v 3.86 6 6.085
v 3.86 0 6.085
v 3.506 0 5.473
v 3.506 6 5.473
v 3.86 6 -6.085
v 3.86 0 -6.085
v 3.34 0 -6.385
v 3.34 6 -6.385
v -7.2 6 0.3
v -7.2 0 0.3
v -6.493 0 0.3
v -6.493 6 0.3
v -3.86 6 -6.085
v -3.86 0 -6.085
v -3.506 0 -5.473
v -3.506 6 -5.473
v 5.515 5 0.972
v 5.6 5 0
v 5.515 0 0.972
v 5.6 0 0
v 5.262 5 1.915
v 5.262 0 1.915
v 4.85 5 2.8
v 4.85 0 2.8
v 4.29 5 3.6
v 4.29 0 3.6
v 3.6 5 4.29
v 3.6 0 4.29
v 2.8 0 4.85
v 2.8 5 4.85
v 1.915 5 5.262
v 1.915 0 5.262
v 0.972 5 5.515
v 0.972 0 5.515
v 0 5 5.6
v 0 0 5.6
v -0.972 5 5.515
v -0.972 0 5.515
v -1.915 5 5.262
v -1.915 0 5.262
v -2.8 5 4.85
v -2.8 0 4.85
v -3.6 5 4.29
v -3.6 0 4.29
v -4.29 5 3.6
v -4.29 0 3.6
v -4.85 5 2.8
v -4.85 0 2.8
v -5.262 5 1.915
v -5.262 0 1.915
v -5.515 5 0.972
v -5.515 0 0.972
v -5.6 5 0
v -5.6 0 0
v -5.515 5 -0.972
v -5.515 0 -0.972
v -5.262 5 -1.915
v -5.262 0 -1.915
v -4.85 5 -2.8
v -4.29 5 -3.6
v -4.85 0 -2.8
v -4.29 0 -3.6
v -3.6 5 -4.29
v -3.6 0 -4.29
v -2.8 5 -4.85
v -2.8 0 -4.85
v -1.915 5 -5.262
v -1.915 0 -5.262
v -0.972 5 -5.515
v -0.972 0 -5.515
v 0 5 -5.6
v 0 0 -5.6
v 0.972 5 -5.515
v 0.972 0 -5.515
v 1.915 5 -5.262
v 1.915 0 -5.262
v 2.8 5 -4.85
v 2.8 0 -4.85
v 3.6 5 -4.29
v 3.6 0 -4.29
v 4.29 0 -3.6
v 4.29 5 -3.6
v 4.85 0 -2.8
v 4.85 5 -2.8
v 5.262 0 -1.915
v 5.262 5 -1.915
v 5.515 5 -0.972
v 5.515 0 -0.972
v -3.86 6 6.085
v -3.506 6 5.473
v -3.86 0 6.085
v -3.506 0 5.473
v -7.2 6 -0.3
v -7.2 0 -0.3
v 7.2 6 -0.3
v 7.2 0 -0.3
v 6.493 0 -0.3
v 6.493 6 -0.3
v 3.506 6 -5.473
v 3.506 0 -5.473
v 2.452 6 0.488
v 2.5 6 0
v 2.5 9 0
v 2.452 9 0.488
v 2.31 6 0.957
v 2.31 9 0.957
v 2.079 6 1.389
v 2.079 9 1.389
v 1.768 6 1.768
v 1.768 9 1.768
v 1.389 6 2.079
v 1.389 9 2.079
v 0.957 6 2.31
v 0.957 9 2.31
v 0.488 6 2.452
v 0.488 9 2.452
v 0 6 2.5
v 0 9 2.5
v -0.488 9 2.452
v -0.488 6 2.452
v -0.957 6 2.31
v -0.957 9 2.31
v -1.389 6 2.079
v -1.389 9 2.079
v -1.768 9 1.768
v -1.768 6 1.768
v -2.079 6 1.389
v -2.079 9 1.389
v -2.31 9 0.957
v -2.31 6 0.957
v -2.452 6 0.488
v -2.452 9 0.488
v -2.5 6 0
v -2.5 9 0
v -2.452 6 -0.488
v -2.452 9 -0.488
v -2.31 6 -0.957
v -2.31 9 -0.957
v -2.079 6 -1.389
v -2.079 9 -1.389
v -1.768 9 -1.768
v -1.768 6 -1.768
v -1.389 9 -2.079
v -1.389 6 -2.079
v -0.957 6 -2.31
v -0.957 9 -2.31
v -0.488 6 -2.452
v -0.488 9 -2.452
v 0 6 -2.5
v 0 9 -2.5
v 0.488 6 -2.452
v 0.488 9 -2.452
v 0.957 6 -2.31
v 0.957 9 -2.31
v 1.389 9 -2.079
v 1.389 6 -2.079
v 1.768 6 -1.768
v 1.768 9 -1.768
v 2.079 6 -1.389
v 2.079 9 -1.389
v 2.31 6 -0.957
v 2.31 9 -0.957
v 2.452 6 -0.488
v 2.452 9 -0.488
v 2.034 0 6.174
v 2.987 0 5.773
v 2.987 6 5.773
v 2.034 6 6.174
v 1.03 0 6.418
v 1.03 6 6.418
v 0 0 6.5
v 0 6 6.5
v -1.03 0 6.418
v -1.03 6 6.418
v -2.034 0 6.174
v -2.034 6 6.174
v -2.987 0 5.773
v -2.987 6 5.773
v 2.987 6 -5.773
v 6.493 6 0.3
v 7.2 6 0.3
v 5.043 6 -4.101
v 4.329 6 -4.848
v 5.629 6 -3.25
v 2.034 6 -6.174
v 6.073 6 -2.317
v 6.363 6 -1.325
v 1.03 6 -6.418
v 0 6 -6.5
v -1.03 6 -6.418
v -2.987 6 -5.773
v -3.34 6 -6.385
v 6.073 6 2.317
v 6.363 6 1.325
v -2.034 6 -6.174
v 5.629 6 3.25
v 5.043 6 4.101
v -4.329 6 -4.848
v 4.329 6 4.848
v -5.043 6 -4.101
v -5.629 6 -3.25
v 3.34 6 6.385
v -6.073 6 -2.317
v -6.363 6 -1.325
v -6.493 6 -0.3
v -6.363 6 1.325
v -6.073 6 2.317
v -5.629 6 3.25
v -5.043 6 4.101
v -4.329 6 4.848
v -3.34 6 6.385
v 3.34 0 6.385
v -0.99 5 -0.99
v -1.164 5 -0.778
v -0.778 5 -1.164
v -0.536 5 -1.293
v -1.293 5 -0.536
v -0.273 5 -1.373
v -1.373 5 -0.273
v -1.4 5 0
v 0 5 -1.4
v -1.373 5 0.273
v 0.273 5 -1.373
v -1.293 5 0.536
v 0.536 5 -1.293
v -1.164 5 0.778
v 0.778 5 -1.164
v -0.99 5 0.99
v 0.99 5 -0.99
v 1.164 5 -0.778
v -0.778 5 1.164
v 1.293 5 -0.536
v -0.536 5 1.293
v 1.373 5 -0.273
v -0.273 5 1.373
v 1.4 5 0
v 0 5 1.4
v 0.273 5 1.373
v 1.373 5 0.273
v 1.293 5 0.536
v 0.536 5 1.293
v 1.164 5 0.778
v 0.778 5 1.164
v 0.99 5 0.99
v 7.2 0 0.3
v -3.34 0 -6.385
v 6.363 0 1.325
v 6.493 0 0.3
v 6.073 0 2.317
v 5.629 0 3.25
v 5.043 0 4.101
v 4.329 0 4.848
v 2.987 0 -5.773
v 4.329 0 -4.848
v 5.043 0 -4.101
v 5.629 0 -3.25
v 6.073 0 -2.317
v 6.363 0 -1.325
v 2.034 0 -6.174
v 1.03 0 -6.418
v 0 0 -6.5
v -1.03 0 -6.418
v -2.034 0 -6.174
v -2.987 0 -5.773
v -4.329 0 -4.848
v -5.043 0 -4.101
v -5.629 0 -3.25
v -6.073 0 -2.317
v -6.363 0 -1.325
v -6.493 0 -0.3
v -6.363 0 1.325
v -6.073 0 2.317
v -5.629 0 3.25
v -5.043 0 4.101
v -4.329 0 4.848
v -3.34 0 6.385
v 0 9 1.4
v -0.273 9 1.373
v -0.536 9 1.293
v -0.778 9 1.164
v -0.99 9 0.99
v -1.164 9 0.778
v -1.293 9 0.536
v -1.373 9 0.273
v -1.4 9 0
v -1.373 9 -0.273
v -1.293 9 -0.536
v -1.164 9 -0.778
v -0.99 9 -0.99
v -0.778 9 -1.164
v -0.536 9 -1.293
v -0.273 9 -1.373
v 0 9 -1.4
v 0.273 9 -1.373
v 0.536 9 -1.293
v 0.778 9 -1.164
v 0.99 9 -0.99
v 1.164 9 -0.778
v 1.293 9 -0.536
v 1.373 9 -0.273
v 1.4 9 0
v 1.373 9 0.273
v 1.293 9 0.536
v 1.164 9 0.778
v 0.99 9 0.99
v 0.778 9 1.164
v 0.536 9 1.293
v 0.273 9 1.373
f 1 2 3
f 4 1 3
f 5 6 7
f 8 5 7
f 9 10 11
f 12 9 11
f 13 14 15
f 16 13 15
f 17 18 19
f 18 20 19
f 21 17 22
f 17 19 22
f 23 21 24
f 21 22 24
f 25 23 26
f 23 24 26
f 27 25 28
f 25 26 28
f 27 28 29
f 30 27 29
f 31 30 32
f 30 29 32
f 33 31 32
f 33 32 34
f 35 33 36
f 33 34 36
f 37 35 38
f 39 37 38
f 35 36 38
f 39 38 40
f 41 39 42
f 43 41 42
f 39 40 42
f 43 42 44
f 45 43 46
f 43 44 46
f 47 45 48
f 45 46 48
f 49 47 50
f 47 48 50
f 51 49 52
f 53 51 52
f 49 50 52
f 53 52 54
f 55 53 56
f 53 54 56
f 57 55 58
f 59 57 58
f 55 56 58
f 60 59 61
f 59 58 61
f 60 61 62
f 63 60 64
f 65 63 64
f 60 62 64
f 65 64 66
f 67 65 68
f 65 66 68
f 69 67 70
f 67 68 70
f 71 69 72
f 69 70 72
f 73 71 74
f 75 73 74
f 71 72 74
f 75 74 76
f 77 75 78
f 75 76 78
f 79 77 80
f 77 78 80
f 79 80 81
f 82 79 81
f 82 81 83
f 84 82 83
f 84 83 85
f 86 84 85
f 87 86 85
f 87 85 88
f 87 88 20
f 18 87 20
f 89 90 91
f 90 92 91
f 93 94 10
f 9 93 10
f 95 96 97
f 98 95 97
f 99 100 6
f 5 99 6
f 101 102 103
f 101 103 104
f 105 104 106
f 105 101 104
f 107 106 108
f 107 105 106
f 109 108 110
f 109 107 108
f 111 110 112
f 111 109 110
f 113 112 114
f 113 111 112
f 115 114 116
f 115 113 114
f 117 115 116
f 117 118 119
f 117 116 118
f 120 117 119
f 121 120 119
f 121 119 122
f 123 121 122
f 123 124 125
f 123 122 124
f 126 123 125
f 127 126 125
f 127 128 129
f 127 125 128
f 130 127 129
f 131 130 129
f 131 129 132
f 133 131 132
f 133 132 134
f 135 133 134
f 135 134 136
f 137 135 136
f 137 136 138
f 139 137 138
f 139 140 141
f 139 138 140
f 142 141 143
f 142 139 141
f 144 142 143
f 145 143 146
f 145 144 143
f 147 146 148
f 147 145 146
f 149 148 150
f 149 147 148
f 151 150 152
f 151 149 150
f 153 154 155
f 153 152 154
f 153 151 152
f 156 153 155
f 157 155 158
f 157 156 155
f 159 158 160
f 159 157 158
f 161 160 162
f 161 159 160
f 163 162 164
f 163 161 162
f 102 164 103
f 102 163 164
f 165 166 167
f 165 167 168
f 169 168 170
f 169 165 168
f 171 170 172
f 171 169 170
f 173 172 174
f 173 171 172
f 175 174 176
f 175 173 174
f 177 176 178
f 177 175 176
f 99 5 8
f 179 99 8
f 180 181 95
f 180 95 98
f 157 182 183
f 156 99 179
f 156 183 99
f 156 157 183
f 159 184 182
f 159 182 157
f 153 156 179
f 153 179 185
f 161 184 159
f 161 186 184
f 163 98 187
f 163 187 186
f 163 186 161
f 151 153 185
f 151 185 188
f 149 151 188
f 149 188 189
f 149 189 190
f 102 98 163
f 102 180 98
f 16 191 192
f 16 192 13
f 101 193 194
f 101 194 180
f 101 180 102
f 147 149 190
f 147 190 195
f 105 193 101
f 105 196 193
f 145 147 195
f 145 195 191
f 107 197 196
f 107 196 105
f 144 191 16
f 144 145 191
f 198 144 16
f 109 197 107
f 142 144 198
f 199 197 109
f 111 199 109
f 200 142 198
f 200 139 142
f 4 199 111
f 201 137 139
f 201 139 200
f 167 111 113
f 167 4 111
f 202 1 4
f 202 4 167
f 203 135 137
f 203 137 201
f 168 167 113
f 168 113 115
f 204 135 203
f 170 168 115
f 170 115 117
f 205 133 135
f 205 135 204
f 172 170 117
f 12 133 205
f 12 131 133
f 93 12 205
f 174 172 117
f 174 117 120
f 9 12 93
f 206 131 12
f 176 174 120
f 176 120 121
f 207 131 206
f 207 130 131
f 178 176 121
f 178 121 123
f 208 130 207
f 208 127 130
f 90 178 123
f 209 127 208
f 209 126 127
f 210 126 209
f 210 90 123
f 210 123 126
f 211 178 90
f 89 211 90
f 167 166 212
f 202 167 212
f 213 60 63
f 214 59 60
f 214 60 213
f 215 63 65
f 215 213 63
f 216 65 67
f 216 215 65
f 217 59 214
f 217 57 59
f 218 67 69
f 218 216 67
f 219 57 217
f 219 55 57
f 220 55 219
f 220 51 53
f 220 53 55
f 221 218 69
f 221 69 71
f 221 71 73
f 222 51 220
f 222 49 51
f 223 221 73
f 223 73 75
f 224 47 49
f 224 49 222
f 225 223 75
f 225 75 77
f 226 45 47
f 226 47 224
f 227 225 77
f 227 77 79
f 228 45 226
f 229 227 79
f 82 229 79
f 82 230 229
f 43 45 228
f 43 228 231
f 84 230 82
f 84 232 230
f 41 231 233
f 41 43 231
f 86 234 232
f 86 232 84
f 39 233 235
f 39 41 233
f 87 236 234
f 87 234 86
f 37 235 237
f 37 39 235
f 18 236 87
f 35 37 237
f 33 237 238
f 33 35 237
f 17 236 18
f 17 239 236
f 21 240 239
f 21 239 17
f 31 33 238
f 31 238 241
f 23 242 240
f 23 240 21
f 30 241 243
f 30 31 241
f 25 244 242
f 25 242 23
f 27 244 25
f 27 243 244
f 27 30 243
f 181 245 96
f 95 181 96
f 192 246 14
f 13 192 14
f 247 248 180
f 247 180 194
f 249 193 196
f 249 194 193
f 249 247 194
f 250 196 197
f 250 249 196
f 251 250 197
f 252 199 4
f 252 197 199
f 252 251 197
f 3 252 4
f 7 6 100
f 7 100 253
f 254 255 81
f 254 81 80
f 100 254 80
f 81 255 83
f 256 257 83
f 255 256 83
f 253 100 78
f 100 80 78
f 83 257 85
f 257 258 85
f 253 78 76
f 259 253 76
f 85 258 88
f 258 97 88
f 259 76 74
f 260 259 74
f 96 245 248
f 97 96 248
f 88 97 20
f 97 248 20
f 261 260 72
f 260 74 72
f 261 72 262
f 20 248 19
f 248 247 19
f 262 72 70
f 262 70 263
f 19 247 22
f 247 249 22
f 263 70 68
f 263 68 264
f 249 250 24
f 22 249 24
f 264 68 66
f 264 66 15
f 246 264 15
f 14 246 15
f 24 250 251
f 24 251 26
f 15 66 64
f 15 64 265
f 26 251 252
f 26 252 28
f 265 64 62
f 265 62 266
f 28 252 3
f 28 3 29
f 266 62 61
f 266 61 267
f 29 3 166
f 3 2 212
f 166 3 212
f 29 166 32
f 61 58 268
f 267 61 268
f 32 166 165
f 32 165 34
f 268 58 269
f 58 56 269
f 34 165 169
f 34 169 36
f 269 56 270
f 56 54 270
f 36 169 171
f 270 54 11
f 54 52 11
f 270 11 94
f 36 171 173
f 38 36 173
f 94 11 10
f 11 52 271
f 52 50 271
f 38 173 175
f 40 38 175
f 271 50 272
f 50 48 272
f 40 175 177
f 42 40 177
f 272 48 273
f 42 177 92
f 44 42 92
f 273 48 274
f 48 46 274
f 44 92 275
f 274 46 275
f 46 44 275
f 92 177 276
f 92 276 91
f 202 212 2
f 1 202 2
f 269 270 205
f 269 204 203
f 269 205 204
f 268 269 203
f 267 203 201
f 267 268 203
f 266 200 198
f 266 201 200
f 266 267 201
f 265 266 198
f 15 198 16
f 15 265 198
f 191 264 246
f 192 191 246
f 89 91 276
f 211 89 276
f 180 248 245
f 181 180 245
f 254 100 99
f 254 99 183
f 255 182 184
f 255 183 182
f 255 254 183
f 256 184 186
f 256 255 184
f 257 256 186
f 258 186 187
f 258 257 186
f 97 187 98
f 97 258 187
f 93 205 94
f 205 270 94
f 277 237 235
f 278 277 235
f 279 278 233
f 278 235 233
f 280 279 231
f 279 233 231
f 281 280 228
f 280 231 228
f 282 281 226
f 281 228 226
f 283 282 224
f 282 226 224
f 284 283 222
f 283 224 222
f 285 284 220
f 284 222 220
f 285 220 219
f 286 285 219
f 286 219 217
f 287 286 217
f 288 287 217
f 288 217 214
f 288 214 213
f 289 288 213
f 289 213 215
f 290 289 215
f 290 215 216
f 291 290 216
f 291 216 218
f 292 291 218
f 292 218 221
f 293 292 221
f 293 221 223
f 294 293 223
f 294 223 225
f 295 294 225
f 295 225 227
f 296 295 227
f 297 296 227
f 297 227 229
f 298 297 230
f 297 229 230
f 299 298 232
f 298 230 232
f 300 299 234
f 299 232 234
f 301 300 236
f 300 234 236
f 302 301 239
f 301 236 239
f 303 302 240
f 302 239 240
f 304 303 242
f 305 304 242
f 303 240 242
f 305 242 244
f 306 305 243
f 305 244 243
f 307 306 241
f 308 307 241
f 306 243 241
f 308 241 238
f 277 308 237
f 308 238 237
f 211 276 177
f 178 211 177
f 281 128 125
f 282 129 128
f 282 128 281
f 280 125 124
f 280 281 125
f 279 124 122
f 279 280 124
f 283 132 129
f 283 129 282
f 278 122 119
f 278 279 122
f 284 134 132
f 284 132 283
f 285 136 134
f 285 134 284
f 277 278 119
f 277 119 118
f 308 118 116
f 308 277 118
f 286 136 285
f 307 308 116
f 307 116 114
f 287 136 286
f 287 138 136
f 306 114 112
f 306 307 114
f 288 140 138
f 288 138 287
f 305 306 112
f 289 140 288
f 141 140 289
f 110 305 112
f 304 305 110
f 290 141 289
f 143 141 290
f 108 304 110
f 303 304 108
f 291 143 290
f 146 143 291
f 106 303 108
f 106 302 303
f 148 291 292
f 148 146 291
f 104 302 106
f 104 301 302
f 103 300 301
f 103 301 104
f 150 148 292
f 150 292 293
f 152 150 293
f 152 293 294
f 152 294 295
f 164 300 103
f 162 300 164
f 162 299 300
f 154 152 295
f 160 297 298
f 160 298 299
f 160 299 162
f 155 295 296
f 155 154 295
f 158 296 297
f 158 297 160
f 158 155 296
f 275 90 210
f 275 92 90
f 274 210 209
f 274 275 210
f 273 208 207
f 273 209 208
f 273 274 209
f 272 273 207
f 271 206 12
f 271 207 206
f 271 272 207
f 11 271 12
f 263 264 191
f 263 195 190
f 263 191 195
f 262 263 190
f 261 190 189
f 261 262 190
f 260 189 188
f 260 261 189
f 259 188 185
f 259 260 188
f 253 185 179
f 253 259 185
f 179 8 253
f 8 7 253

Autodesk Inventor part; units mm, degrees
ref_plane "YZ Plane" through (0, 0, 0) normal (1, 0, 0) x (0, 1, 0)
ref_plane "XZ Plane" through (0, 0, 0) normal (0, 1, 0) x (-1, 0, 0)
ref_plane "XY Plane" through (0, 0, 0) normal (0, 0, 1) x (1, 0, 0)
sketch "スケッチ1" plane through (0, 0, 0) normal (0, 1, 0) x (-1, 0, 0)
  circle A0 centre (0, 0) radius 6.5
  line L0 (0, 0) -> (0, -6.5) construction
  line L1 (3.5063, -5.4732) -> (2.9867, -5.7732)
  line L2 (2.9867, -5.7732) -> (3.3402, -6.3854)
  line L3 (3.3402, -6.3854) -> (3.8598, -6.0854)
  line L4 (3.8598, -6.0854) -> (3.5063, -5.4732)
  line L5 (0, 0) -> (3.6, -6.2354) construction
  line L6 (6.4931, 0.3) -> (6.4931, -0.3)
  line L7 (6.4931, -0.3) -> (7.2, -0.3)
  line L8 (7.2, -0.3) -> (7.2, 0.3)
  line L9 (7.2, 0.3) -> (6.4931, 0.3)
  line L10 (0, 0) -> (7.2, 0) construction
  line L11 (2.9867, 5.7732) -> (3.5063, 5.4732)
  line L12 (3.5063, 5.4732) -> (3.8598, 6.0854)
  line L13 (3.8598, 6.0854) -> (3.3402, 6.3854)
  line L14 (3.3402, 6.3854) -> (2.9867, 5.7732)
  line L15 (0, 0) -> (3.6, 6.2354) construction
  line L16 (-3.5063, 5.4732) -> (-2.9867, 5.7732)
  line L17 (-2.9867, 5.7732) -> (-3.3402, 6.3854)
  line L18 (-3.3402, 6.3854) -> (-3.8598, 6.0854)
  line L19 (-3.8598, 6.0854) -> (-3.5063, 5.4732)
  line L20 (0, 0) -> (-3.6, 6.2354) construction
  line L21 (-6.4931, -0.3) -> (-6.4931, 0.3)
  line L22 (0, 0) -> (-7.2, 0) construction
  line L23 (-6.4931, 0.3) -> (-7.2, 0.3)
  line L24 (-7.2, -0.3) -> (-6.4931, -0.3)
  line L25 (-7.2, 0.3) -> (-7.2, -0.3)
  line L26 (0, 0) -> (-3.6, -6.2354) construction
  line L27 (-2.9867, -5.7732) -> (-3.5063, -5.4732)
  line L28 (-3.5063, -5.4732) -> (-3.8598, -6.0854)
  line L29 (-3.8598, -6.0854) -> (-3.3402, -6.3854)
  line L30 (-3.3402, -6.3854) -> (-2.9867, -5.7732)
  dimension "d0" = 13
  dimension "d3" = 30
  dimension "d4" = 7.2
  dimension "d6" = 0.6
  dimension "d7" = 7.2
  dimension "d8" = 0.6
  dimension "d9" = 90
  dimension "d10" = 7.2
  dimension "d11" = 0.6
  dimension "d12" = 150
  dimension "d13" = 7.2
  dimension "d14" = 0.6
  dimension "d15" = 7.2
  dimension "d16" = 0.6
  dimension "d17" = 7.2
  dimension "d18" = 0.6
  dimension "d19" = 30
  dimension "d20" = 90
  dimension "d21" = 150
extrude "押し出し1" add sketch "スケッチ1" along normal blind 6
sketch "スケッチ2" plane through (0, 6, 0) normal (0, 1, 0) x (1, 0, 0)
  circle A0 centre (0, 0) radius 2.5
  dimension "d24" = 5
extrude "押し出し2" add sketch "スケッチ2" along normal blind 3
sketch "スケッチ3" plane through (0, 9, 0) normal (0, 1, 0) x (1, 0, 0)
  point P0 (0, 0)
  point P1 (0, 0)
hole "穴1" at (0, 9, 0) direction (0, -1, 0) diameter 2.8 end through all
sketch "スケッチ4" plane through (0, 0, 0) normal (0, -1, 0) x (1, 0, 0)
  circle A0 centre (0, 0) radius 5.6
  dimension "d34" = 11.2
extrude "押し出し3" cut sketch "スケッチ4" against normal blind 5
properties part number "CamCap_holder"
